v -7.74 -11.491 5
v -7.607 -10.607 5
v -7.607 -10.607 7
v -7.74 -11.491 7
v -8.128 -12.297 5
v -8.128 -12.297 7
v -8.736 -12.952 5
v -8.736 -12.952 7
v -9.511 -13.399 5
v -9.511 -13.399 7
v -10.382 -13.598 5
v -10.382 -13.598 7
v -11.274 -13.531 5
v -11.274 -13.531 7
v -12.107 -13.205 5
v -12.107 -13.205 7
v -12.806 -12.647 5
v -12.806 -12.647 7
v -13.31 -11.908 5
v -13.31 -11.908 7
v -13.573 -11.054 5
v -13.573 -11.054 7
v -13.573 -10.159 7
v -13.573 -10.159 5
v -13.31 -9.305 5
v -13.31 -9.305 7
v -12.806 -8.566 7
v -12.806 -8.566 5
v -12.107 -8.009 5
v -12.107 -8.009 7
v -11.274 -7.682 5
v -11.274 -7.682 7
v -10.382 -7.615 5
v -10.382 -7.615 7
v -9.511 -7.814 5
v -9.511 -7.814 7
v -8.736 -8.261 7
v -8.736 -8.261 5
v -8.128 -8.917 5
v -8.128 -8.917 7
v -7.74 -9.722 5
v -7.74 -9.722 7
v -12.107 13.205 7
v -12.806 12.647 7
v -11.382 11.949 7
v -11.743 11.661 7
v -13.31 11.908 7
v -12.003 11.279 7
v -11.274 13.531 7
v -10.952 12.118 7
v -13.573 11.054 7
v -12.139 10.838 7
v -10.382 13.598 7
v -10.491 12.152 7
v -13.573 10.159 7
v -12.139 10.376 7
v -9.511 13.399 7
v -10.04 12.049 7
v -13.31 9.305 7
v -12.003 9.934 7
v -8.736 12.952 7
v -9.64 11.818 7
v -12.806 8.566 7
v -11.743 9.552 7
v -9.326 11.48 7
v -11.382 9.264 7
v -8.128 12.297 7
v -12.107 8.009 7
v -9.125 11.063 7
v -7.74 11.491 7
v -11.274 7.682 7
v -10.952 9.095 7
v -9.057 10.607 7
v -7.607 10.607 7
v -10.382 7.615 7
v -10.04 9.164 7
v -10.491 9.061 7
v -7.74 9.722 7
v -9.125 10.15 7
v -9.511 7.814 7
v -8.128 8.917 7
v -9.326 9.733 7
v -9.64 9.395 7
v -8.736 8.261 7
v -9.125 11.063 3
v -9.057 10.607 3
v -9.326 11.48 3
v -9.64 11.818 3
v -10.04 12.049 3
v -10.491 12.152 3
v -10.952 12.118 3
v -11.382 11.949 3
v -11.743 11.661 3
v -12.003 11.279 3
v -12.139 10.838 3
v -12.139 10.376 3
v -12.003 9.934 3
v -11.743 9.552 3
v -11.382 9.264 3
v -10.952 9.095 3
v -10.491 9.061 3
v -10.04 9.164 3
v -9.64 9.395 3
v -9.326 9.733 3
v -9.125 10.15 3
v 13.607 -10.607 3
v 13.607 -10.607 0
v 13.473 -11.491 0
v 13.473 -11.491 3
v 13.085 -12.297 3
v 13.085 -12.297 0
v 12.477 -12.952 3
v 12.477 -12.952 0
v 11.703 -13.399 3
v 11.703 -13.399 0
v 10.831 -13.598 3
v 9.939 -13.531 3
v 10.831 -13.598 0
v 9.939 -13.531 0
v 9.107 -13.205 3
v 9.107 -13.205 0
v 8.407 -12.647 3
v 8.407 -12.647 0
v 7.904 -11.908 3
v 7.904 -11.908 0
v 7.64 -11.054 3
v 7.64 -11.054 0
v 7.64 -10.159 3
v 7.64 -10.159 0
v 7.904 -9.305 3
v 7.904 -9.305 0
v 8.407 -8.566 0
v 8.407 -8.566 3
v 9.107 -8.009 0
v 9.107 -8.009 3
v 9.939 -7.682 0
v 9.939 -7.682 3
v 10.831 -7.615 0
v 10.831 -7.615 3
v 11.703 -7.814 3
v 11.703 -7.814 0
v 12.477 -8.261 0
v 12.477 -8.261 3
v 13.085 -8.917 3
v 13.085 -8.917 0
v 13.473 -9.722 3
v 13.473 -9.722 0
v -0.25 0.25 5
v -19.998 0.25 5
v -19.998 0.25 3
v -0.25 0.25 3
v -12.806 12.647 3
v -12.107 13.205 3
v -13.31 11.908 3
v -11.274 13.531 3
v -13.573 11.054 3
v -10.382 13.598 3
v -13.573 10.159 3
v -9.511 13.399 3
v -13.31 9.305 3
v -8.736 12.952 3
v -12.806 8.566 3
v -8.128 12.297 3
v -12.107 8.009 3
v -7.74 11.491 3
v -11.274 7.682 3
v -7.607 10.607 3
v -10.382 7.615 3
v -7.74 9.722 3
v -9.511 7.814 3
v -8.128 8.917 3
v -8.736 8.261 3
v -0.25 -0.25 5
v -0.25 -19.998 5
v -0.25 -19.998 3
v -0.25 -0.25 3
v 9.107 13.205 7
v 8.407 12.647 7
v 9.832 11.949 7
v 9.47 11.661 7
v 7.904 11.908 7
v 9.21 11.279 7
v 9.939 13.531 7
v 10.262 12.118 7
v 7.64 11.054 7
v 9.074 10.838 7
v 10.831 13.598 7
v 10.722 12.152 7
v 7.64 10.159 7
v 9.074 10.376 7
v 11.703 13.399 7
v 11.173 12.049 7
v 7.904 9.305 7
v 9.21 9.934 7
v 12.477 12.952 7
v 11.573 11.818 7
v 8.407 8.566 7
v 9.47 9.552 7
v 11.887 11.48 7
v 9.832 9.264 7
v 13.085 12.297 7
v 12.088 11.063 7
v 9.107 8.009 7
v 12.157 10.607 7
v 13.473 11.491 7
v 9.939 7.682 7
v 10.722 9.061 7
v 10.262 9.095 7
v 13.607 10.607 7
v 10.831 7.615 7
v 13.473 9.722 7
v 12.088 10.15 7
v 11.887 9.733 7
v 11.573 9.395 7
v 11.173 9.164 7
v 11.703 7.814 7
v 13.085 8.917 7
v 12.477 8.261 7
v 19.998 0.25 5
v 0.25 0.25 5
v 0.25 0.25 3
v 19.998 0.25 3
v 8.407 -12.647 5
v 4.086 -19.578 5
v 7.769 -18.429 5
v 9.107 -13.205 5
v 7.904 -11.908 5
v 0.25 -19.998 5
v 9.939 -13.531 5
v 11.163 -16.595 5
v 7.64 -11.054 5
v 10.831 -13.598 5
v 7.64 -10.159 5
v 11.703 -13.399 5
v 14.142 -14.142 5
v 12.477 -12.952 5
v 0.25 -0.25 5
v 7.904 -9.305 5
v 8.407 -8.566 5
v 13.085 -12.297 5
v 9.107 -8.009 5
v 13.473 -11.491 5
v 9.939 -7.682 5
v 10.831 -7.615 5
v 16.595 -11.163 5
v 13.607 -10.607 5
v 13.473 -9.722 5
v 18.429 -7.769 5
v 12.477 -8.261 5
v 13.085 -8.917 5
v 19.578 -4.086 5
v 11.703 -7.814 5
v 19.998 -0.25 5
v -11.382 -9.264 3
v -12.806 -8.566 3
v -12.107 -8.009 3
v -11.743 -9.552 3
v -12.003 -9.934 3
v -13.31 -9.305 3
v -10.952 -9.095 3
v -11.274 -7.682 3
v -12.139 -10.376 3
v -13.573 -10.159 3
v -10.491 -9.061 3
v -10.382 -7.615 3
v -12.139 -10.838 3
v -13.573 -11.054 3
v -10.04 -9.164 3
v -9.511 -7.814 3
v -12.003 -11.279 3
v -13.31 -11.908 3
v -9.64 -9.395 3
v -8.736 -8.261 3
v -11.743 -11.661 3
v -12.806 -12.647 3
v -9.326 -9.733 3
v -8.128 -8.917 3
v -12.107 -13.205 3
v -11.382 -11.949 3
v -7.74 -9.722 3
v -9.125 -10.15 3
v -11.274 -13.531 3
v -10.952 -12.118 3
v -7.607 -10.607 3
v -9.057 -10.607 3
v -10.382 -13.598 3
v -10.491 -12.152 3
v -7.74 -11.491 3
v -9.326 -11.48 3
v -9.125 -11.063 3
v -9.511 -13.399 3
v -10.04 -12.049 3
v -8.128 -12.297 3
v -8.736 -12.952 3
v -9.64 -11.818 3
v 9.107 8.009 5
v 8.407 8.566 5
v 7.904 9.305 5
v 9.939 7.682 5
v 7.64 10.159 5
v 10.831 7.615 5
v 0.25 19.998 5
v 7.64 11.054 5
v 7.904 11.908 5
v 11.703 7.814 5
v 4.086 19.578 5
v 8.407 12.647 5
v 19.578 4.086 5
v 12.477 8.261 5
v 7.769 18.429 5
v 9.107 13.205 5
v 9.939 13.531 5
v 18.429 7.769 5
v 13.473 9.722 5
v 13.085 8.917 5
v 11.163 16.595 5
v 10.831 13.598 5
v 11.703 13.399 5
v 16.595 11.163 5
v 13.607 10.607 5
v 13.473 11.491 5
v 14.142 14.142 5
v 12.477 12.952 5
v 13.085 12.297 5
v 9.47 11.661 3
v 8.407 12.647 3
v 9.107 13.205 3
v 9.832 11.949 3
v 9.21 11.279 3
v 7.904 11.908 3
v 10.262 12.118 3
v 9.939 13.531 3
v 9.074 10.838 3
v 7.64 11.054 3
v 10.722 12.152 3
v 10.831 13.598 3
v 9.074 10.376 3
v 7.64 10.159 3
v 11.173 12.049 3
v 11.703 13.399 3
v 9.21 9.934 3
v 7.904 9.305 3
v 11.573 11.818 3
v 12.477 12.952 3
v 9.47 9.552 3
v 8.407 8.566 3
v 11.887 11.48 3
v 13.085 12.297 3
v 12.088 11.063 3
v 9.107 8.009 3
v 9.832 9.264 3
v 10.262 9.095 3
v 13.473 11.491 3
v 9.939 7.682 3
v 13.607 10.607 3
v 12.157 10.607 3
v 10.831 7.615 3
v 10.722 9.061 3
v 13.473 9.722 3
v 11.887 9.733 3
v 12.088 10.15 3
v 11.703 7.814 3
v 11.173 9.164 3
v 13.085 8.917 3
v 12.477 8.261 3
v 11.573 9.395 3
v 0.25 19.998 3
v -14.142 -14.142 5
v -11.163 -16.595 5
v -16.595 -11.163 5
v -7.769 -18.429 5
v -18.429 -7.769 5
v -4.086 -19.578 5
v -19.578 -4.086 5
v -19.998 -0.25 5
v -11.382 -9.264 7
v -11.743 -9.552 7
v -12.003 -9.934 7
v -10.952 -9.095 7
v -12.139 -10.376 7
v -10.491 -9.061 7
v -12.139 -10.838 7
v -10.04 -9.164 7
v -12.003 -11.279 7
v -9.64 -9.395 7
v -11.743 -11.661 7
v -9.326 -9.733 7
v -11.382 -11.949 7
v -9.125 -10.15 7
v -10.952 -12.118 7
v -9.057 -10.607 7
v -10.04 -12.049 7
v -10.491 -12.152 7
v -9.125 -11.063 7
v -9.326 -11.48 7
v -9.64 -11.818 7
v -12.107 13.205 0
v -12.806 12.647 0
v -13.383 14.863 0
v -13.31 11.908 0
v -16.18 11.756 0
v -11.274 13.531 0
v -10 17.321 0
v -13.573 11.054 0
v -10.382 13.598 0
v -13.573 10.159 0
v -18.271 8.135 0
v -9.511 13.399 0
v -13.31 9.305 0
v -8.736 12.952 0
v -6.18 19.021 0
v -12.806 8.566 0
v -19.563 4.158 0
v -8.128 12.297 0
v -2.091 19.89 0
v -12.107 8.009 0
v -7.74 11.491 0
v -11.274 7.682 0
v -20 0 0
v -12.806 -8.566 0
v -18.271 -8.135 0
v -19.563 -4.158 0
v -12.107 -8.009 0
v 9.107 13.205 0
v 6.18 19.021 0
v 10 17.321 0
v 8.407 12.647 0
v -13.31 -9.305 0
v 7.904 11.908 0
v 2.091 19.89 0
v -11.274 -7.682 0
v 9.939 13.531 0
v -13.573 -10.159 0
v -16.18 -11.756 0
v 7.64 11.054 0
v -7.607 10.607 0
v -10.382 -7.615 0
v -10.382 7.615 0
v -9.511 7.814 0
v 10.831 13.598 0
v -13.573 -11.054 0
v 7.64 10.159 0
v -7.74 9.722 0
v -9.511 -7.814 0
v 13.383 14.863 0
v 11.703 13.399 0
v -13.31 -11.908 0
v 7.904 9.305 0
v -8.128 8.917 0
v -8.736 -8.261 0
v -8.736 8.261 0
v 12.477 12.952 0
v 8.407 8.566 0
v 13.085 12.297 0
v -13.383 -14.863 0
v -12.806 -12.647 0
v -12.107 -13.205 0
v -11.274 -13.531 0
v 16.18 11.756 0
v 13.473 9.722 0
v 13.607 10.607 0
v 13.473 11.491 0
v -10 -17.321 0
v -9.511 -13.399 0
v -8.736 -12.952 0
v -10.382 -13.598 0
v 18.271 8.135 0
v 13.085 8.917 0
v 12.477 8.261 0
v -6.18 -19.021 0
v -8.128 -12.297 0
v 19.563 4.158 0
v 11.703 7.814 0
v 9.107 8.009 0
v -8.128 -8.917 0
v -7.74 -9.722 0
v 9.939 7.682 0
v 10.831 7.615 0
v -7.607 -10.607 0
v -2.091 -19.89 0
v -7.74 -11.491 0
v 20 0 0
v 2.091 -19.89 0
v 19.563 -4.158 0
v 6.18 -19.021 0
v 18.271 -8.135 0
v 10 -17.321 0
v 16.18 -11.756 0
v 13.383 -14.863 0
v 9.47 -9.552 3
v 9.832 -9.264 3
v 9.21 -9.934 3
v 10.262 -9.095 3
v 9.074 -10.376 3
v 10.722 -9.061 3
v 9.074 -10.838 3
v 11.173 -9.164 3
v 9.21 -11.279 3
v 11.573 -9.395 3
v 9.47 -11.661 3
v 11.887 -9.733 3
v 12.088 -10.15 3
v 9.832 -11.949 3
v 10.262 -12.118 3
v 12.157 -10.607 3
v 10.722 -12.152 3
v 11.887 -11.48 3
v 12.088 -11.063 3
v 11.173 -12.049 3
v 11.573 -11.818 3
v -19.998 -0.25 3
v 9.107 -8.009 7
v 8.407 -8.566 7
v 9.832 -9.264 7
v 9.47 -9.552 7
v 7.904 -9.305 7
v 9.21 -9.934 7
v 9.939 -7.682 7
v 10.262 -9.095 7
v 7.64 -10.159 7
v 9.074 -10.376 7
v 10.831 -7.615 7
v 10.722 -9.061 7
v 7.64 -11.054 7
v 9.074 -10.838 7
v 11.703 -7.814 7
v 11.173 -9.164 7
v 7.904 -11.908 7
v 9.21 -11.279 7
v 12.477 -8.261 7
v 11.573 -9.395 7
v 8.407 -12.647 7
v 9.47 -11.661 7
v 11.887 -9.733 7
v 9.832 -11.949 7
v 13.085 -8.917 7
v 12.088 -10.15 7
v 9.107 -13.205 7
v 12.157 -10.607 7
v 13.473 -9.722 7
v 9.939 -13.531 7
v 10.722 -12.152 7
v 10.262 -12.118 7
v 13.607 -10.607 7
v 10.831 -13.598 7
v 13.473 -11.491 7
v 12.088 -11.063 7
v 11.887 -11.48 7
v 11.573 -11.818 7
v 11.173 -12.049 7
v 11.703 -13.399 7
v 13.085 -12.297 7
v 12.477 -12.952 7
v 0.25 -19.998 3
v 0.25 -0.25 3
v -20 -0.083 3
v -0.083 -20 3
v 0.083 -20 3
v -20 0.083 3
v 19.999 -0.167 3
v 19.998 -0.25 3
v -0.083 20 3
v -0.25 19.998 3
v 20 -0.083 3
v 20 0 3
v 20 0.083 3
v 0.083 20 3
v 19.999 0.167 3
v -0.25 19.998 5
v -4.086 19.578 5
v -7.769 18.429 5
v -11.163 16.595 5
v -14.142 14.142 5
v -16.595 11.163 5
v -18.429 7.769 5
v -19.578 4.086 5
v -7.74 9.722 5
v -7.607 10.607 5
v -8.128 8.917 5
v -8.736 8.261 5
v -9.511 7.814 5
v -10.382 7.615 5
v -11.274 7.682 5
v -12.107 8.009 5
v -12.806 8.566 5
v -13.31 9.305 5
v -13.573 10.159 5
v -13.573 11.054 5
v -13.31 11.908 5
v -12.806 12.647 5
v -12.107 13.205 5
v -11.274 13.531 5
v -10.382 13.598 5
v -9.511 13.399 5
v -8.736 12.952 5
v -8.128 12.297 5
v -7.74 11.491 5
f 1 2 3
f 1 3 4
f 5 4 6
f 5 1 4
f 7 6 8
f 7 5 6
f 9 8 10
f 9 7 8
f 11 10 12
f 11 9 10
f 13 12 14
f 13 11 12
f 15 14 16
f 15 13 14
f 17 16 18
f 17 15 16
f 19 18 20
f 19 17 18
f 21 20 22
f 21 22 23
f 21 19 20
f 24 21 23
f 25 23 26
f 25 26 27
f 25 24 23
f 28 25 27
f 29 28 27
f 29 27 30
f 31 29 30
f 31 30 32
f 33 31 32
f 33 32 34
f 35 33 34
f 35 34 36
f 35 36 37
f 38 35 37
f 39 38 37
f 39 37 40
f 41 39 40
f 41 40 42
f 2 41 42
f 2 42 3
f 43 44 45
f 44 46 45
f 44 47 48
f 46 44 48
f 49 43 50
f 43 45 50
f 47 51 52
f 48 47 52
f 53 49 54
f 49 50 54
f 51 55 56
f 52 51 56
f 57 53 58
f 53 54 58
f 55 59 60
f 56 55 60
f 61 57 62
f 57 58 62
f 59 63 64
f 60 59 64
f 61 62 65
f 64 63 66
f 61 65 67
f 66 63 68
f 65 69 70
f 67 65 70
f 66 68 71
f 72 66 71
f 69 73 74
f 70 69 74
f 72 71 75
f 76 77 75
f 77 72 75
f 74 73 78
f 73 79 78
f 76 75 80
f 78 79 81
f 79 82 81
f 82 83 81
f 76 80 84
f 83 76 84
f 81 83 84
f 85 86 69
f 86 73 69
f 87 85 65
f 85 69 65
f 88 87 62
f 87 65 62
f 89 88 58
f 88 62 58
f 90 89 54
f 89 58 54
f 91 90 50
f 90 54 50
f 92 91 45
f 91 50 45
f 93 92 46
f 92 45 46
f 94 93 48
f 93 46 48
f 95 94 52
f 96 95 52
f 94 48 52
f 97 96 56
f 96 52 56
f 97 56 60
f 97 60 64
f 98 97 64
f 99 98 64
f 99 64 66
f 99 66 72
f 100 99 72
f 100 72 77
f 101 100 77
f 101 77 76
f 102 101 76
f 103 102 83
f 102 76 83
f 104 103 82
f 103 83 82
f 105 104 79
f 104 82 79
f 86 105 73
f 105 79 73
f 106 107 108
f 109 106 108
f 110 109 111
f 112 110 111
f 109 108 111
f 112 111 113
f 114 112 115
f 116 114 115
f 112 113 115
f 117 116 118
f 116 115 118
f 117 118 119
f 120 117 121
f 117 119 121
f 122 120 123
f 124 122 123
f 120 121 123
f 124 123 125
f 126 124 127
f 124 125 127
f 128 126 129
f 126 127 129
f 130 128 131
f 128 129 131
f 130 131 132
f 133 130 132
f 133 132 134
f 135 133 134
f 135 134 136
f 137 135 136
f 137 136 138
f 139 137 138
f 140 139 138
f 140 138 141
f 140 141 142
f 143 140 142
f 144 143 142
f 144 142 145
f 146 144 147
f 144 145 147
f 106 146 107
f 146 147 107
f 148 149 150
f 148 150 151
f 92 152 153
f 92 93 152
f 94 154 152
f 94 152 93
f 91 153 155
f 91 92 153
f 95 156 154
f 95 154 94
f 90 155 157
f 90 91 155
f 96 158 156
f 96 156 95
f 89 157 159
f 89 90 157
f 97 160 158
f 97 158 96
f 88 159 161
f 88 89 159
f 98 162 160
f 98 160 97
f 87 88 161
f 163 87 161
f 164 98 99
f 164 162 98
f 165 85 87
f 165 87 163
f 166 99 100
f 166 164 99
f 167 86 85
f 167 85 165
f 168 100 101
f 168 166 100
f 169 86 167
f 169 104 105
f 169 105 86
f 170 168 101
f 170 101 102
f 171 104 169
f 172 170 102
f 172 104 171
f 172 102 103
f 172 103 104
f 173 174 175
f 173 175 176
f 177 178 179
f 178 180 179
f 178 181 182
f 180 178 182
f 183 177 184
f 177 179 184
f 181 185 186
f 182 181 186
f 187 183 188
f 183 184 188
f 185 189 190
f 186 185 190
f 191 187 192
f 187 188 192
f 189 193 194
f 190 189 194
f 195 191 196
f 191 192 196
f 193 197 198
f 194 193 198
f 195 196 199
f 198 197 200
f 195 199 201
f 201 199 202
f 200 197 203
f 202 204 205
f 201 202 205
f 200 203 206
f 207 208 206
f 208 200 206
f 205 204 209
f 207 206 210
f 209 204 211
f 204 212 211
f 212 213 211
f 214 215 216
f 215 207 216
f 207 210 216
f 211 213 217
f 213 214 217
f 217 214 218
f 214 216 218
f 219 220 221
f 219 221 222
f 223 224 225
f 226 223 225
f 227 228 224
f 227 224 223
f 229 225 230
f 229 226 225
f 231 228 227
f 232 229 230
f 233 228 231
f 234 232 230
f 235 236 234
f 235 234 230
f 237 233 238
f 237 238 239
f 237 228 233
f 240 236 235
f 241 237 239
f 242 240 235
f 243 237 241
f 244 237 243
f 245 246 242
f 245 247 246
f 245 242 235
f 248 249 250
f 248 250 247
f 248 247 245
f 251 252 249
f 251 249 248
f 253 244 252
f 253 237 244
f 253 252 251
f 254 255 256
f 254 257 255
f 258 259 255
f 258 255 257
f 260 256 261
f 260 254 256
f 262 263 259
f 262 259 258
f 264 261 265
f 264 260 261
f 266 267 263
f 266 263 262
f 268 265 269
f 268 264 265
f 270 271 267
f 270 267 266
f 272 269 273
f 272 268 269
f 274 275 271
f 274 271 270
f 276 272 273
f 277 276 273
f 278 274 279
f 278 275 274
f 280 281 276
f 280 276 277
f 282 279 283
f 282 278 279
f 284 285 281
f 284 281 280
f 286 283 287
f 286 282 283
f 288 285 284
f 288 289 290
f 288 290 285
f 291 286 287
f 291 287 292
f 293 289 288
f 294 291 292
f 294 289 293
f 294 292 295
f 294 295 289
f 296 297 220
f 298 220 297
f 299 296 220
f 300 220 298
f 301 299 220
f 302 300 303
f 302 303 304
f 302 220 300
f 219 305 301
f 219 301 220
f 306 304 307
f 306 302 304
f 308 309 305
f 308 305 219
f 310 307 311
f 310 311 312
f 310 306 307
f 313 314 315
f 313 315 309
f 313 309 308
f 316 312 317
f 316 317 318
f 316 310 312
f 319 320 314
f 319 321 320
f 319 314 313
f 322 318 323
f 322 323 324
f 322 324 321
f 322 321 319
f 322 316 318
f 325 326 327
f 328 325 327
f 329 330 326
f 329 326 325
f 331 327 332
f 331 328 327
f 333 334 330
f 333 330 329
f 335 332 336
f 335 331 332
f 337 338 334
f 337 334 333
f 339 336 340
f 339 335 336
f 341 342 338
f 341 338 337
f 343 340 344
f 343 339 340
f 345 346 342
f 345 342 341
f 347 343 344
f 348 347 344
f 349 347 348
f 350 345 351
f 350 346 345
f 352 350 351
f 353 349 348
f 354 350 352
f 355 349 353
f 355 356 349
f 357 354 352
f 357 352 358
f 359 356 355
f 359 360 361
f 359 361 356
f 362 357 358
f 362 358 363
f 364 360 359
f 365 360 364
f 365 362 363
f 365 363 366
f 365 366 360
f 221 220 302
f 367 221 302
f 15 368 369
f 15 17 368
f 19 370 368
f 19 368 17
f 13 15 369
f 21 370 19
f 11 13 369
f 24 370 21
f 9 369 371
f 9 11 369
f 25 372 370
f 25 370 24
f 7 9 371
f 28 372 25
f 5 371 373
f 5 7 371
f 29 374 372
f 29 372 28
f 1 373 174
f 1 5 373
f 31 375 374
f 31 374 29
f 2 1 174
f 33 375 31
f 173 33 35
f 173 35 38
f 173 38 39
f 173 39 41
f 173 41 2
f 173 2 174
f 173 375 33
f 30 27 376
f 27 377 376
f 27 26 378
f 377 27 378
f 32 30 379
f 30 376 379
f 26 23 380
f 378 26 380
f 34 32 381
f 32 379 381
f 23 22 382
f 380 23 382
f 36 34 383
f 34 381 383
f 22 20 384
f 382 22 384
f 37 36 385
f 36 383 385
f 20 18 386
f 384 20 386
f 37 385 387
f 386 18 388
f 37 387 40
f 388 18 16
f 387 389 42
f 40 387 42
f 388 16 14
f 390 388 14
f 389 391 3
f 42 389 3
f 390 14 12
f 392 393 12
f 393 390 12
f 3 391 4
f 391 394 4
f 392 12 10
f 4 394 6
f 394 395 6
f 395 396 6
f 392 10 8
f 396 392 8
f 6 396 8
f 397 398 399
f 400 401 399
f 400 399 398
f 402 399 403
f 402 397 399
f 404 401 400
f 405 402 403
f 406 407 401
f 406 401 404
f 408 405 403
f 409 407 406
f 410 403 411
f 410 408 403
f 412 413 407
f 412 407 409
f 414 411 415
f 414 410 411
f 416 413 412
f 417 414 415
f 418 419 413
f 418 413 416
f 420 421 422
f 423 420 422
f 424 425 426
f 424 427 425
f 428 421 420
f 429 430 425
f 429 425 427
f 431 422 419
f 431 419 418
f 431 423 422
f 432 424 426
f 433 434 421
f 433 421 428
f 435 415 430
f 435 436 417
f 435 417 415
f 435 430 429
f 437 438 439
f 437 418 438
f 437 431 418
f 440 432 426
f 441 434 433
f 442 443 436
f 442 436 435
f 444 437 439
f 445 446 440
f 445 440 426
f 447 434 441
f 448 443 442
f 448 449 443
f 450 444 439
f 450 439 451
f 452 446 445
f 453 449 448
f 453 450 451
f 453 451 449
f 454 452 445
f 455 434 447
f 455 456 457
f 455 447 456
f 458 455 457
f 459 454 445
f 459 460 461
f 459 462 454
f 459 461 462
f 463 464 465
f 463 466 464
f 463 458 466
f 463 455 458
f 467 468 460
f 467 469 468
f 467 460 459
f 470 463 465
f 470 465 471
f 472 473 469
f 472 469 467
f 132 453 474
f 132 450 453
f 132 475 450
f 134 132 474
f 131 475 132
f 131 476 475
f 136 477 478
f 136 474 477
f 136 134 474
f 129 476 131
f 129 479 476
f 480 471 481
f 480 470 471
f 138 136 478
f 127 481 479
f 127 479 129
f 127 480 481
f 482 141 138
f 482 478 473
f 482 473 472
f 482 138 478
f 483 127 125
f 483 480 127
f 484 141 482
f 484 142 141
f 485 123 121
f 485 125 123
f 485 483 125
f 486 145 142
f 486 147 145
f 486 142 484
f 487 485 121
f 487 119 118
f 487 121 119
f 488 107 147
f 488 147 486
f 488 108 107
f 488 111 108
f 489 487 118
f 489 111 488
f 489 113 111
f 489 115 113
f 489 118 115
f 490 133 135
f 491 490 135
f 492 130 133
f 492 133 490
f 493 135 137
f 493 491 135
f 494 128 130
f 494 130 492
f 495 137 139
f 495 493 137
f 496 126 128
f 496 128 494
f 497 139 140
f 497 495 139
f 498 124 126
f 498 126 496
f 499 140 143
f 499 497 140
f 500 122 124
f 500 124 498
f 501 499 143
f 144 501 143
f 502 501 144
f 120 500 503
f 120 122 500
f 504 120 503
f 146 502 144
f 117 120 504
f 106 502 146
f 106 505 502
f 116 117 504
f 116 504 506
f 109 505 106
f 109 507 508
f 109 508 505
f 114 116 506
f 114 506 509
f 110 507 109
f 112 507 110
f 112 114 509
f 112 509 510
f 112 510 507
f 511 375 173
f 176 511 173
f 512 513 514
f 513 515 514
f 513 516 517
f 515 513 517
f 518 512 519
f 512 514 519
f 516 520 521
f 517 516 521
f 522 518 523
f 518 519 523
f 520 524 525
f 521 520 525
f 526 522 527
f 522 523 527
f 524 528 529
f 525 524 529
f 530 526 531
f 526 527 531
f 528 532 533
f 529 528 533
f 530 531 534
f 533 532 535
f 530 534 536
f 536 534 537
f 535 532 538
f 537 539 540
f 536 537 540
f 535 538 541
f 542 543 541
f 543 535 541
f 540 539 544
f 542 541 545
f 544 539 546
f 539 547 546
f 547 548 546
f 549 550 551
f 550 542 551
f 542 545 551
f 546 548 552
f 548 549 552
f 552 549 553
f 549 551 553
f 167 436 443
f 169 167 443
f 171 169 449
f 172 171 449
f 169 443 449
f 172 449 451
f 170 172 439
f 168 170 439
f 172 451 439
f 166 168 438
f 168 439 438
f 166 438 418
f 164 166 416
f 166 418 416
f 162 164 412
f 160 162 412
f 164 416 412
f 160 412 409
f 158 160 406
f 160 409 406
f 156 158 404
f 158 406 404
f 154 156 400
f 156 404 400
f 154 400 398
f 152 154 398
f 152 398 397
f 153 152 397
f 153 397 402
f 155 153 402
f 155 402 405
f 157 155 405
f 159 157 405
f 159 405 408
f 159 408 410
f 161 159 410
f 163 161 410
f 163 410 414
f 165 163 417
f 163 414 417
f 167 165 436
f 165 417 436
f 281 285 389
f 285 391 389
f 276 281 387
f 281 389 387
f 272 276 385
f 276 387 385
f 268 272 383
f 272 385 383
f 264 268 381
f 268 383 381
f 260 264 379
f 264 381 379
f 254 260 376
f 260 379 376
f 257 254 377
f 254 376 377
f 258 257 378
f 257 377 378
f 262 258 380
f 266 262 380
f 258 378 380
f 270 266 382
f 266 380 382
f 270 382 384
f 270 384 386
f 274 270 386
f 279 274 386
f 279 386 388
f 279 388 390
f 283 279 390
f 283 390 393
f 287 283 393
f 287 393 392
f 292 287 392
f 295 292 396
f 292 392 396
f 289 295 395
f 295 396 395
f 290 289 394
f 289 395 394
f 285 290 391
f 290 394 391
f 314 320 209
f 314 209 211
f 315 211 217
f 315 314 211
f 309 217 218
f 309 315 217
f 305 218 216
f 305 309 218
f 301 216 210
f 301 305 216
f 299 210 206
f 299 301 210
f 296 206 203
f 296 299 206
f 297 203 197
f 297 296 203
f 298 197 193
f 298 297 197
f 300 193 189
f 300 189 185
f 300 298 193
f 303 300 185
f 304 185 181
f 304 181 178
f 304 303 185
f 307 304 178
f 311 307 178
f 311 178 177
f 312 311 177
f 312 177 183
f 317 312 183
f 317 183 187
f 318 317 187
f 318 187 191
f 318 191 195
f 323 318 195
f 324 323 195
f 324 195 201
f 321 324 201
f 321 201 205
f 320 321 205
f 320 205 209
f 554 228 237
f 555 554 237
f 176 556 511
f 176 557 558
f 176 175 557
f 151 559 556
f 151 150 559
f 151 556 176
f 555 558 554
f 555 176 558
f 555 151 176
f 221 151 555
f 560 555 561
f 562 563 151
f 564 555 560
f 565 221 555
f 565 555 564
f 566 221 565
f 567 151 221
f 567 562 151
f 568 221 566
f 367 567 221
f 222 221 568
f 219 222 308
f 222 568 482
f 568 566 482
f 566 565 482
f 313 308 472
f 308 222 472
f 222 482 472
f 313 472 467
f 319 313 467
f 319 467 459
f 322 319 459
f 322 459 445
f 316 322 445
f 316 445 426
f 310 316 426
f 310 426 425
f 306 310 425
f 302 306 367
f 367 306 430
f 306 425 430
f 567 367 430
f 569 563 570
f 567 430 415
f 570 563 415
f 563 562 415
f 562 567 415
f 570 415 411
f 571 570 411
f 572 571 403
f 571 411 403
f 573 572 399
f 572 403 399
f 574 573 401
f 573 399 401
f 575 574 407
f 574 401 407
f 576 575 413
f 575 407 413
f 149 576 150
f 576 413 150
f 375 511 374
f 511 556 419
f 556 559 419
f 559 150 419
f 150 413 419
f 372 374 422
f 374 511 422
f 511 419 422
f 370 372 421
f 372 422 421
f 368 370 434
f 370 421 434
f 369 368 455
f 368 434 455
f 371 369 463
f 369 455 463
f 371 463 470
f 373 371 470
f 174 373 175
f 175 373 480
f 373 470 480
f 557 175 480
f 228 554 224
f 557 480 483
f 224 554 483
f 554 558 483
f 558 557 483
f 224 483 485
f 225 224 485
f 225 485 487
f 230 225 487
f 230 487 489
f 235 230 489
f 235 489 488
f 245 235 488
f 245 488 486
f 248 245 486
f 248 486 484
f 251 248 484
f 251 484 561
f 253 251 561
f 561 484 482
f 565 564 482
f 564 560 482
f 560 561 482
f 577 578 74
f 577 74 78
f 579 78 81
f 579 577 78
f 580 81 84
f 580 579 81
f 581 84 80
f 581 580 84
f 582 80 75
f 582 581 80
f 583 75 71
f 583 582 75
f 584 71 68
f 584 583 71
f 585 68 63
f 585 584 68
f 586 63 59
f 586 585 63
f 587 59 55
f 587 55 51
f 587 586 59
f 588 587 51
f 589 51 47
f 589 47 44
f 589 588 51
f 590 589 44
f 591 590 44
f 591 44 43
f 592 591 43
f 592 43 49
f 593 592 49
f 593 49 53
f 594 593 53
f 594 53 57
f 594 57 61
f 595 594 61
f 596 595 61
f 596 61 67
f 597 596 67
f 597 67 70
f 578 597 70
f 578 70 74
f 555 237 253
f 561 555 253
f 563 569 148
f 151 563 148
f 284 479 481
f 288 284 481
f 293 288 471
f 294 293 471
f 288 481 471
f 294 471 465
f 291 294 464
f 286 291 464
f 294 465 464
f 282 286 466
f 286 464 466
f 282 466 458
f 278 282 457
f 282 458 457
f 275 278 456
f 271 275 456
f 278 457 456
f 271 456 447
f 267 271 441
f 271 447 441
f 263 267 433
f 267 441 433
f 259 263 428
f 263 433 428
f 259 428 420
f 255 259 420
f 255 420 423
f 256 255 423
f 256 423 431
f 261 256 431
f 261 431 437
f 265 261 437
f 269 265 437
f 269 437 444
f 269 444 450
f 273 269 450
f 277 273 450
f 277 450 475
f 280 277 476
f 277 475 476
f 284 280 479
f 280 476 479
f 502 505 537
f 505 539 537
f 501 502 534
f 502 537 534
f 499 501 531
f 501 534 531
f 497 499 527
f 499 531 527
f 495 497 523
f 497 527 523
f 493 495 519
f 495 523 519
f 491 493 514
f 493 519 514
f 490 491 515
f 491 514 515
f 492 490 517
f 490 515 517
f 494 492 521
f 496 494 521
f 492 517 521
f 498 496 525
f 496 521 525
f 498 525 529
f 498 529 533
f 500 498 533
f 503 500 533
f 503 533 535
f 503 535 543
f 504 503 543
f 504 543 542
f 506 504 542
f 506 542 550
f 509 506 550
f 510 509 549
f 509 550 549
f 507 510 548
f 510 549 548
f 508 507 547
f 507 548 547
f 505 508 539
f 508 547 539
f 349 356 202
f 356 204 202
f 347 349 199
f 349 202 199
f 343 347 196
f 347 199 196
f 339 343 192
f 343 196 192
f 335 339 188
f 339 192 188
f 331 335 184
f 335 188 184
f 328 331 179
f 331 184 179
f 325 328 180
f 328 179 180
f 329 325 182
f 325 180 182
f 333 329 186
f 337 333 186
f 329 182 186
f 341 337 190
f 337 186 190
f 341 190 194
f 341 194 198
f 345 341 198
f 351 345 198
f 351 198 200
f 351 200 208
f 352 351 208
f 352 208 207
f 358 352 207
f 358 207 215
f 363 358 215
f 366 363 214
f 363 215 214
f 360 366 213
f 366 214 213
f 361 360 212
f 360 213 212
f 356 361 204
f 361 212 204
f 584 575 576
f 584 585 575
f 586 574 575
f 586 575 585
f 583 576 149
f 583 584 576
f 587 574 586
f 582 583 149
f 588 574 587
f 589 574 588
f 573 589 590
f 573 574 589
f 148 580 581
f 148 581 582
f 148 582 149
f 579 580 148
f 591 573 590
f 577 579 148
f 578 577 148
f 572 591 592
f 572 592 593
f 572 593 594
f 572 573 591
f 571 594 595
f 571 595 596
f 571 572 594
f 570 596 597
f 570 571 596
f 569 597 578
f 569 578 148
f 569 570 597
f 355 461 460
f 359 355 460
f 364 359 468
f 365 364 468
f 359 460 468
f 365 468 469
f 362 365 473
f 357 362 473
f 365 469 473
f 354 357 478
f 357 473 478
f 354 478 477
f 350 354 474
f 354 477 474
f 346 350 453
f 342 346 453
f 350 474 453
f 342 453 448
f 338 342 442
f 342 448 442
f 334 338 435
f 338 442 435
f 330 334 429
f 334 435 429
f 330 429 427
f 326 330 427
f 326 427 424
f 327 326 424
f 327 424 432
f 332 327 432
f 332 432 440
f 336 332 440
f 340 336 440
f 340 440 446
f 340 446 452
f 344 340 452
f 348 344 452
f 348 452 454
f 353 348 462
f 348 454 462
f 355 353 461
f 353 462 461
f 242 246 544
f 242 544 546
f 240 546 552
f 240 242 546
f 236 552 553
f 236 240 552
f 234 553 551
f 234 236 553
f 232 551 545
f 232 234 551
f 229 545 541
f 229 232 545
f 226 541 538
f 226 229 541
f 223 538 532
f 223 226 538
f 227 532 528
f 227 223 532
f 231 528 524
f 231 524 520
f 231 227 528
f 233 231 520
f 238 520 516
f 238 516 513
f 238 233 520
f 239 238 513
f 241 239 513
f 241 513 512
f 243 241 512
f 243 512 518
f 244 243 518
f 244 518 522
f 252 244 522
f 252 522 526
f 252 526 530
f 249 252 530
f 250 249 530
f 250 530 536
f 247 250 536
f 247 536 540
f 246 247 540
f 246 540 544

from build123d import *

# Parameters (mm, degrees)
F0_R     = 20
F1_DEPTH = 5
F2_W     = 0.5
F2_H     = 21.0267571211
F2_H_2   = 0.5
F2_W_2   = 21.8651188016
F2_W_3   = 23.3558980227
F2_H_3   = 21.8529557288
F3_DEPTH = 2
F5_R     = 3
F6_DEPTH = 7
F7_DEPTH = 3
F4_R     = 1.55
F8_DEPTH = 5.001
F9_DEPTH = 2.001


with BuildPart() as f1:
    # F0 (on Top) → F1 (new body)
    with BuildSketch(Plane.XY):
        Circle(F0_R)
    extrude(amount=F1_DEPTH)

    # F2 (on face) → F3 (cut)
    with BuildSketch(Plane.XY.offset(5)):
        with Locations((0, 10.7633785605)):
            Rectangle(F2_W, F2_H)
        Rectangle(F2_W, F2_H_2)
        with Locations((-11.1825594008, 0)):
            Rectangle(F2_W_2, F2_H_2)
        with Locations((11.9279490113, 0)):
            Rectangle(F2_W_3, F2_H_2)
        with Locations((0, -11.1764778644)):
            Rectangle(F2_W, F2_H_3)
    extrude(amount=-F3_DEPTH, mode=Mode.SUBTRACT)

    # F5 (on face) → F6 (join)
    with BuildSketch(Plane(origin=(0, 0, 0), x_dir=(1, 0, 0), z_dir=(0, 0, -1))):
        with Locations((-10.6066017178, 10.6066017178)):
            Circle(F5_R)
        with Locations((10.6066017178, 10.6066017178)):
            Circle(F5_R)
        with Locations((10.6066017178, -10.6066017178)):
            Circle(F5_R)
        with Locations((-10.6066017178, -10.6066017178)):
            Circle(F5_R)
    extrude(amount=-F6_DEPTH)

    # F5 (on face) → F7 (cut)
    with BuildSketch(Plane(origin=(0, 0, 0), x_dir=(1, 0, 0), z_dir=(0, 0, -1))):
        with Locations((-10.6066017178, 10.6066017178)):
            Circle(F5_R)
        with Locations((10.6066017178, 10.6066017178)):
            Circle(F5_R)
        with Locations((10.6066017178, -10.6066017178)):
            Circle(F5_R)
        with Locations((-10.6066017178, -10.6066017178)):
            Circle(F5_R)
    extrude(amount=-F7_DEPTH, mode=Mode.SUBTRACT)

    # F4 (on face) → F8 (cut, through all)
    with BuildSketch(Plane.XY.offset(5)):
        with Locations((10.6066017178, -10.6066017178)):
            Circle(F4_R)
        with Locations((10.6066017178, 10.6066017178)):
            Circle(F4_R)
        with Locations((-10.6066017178, 10.6066017178)):
            Circle(F4_R)
        with Locations((-10.6066017178, -10.6066017178)):
            Circle(F4_R)
    extrude(amount=-F8_DEPTH, mode=Mode.SUBTRACT)

    # F4 (on face) → F9 (cut, through all)
    with BuildSketch(Plane.XY.offset(5)):
        with Locations((10.6066017178, -10.6066017178)):
            Circle(F4_R)
        with Locations((10.6066017178, 10.6066017178)):
            Circle(F4_R)
        with Locations((-10.6066017178, 10.6066017178)):
            Circle(F4_R)
        with Locations((-10.6066017178, -10.6066017178)):
            Circle(F4_R)
    extrude(amount=F9_DEPTH, mode=Mode.SUBTRACT)


solid = f1.part
